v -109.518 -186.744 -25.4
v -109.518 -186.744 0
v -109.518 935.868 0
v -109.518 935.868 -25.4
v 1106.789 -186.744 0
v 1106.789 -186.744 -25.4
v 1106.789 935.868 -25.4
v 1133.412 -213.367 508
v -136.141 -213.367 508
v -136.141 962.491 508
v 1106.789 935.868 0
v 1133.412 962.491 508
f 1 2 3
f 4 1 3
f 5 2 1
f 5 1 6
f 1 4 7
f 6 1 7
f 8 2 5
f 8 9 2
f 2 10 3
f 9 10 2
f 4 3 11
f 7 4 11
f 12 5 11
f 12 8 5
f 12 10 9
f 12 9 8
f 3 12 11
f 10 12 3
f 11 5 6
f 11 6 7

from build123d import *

# Parameters (mm, degrees)
F0_W          = 1216.3070216775
F0_H          = 1122.6118505001
F1_DEPTH      = 508
F1_TAPER      = -3
F1_DEPTH_BACK = 25.4


with BuildPart() as f1:
    # F0 (on Top) → F1 (new body, two sides)
    with BuildSketch(Plane.XY) as f1_sk:
        with Locations((498.6356012523, 374.5622783899)):
            Rectangle(F0_W, F0_H)
    extrude(amount=F1_DEPTH, taper=F1_TAPER)
    extrude(f1_sk.sketch, amount=-F1_DEPTH_BACK)


solid = f1.part
